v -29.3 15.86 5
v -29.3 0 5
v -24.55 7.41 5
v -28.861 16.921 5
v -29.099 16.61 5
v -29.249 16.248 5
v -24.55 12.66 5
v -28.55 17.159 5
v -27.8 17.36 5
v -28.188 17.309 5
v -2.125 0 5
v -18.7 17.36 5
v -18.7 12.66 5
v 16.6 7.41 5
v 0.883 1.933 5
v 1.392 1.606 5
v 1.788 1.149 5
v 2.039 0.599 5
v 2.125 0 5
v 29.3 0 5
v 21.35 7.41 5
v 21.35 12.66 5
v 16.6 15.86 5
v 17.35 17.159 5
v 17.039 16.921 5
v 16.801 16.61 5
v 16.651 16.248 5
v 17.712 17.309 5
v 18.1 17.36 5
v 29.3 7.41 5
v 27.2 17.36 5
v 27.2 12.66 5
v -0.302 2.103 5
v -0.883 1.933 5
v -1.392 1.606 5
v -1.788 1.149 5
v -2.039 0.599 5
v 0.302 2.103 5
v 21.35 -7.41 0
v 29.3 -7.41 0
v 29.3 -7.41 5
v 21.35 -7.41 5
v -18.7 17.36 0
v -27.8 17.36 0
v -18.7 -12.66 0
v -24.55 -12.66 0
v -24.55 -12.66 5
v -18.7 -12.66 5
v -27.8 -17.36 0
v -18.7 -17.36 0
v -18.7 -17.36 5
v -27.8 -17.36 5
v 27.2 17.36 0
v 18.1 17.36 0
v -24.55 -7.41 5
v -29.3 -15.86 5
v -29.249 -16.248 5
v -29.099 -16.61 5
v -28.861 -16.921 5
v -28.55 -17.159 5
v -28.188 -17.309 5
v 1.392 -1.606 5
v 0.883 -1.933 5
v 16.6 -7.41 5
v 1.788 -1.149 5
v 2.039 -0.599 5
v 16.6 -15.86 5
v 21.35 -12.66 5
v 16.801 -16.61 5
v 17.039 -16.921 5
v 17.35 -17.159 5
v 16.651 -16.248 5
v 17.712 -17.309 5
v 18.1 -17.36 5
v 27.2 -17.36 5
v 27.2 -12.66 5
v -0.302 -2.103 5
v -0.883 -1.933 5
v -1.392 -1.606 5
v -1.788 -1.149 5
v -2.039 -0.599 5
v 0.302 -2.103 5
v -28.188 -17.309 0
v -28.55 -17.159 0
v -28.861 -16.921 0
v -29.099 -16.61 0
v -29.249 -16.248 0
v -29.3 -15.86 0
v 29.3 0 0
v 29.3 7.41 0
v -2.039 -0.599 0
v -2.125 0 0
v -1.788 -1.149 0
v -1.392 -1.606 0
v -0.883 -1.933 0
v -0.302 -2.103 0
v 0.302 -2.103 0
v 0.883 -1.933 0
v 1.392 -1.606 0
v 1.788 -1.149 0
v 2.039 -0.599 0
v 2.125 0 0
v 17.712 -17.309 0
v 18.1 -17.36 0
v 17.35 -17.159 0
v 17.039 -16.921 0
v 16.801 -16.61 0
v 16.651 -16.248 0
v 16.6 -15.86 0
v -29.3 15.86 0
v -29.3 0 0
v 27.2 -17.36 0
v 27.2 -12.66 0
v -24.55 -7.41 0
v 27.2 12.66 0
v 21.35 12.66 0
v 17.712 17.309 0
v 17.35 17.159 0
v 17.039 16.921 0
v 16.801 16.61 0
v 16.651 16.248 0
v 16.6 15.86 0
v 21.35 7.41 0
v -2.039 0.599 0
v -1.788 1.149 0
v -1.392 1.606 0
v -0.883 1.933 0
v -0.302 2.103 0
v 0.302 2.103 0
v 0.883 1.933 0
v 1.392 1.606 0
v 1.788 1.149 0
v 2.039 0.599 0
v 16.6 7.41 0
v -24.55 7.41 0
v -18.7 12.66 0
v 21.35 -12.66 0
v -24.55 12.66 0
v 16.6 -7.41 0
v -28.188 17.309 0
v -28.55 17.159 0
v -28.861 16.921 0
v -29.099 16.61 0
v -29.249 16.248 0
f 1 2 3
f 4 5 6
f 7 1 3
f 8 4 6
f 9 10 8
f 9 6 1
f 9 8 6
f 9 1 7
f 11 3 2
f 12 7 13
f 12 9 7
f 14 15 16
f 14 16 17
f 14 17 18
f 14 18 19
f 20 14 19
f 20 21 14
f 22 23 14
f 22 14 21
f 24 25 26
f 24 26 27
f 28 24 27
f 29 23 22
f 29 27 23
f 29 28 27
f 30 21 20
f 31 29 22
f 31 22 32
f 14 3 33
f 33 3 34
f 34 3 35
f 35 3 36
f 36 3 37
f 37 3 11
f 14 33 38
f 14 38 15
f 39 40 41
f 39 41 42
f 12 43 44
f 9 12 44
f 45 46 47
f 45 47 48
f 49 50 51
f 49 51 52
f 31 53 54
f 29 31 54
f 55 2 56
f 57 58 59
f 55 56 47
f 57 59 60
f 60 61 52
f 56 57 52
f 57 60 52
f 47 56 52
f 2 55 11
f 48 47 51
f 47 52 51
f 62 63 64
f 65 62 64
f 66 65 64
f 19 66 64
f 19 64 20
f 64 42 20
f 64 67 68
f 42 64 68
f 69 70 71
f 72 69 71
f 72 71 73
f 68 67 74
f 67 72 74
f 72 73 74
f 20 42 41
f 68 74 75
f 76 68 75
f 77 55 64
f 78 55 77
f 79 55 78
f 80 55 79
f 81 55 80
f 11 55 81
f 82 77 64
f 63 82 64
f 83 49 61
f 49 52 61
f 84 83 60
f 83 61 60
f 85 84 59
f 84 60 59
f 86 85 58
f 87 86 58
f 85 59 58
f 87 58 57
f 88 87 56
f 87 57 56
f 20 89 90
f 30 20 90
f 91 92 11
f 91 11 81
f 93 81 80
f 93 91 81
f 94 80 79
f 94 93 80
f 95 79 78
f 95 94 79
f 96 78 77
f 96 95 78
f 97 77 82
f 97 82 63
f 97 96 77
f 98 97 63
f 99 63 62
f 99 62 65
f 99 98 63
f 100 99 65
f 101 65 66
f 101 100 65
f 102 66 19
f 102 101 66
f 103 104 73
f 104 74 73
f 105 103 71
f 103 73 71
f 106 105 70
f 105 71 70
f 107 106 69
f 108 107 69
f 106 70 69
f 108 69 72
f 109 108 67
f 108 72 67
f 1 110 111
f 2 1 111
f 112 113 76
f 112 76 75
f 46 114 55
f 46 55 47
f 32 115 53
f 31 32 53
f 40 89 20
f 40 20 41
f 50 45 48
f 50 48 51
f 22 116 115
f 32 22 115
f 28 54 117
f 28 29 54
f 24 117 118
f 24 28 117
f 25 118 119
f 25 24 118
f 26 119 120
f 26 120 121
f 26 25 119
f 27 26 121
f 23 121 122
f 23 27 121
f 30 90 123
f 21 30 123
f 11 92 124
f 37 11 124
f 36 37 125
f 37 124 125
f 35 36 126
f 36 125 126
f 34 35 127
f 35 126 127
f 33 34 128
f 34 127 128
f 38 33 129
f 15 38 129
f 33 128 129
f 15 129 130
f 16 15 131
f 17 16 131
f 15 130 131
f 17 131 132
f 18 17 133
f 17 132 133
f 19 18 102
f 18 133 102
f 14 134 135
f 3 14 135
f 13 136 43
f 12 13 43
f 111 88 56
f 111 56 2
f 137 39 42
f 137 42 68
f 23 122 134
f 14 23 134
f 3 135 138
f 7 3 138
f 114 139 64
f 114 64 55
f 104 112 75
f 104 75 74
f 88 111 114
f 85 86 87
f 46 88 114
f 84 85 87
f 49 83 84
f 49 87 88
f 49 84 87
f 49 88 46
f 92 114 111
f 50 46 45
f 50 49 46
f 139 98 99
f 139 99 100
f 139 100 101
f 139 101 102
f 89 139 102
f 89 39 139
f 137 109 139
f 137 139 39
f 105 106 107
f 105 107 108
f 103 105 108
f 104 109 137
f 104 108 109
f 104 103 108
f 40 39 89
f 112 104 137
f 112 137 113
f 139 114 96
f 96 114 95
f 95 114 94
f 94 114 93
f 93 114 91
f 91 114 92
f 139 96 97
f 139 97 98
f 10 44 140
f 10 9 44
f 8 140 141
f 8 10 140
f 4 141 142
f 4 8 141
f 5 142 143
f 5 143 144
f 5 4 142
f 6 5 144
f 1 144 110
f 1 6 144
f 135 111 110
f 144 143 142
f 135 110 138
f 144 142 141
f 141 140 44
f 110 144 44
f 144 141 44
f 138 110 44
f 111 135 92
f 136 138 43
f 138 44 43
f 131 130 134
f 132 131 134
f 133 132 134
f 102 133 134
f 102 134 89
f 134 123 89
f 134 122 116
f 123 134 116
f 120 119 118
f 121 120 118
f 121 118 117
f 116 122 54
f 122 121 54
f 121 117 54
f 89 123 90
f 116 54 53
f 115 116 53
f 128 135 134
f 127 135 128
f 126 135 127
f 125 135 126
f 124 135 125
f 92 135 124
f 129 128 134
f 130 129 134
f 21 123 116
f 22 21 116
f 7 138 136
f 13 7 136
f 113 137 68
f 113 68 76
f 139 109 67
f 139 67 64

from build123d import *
from build123d import SkipClean  # not in build123d's __all__

# Parameters (mm, degrees)
F1_DEPTH = 5
F2_R     = 1.5


with BuildPart() as f1:
    # F0 (on Top) → F1 (new body)
    with BuildSketch(Plane.XY):
        with BuildLine():
            ThreePointArc((-2.125, 0), (0, 2.125), (2.125, 0))
            Line((2.125, 0), (29.3, 0))
            Line((29.3, 0), (29.3, 7.41))
            Line((29.3, 7.41), (21.35, 7.41))
            Line((21.35, 7.41), (21.35, 12.66))
            Line((21.35, 12.66), (27.2, 12.66))
            Line((27.2, 12.66), (27.2, 17.36))
            Line((27.2, 17.36), (16.6, 17.36))
            Line((16.6, 17.36), (16.6, 7.41))
            Line((16.6, 7.41), (-24.55, 7.41))
            Line((-24.55, 7.41), (-24.55, 12.66))
            Line((-24.55, 12.66), (-18.7, 12.66))
            Line((-18.7, 12.66), (-18.7, 17.36))
            Line((-18.7, 17.36), (-29.3, 17.36))
            Line((-29.3, 17.36), (-29.3, 0))
            Line((-29.3, 0), (-2.125, 0))
        make_face()
    extrude(amount=F1_DEPTH)

    # F2
    f2_edges = [f1.edges().sort_by_distance(p)[0] for p in [
        (-29.3, 17.36, 2.5),
        (16.6, 17.36, 2.5),
    ]]
    fillet(f2_edges, radius=F2_R)

    # F3: F1 across face


with BuildPart() as f1_1:
    add(f1.part, clean=False)
    with SkipClean():  # cleaning this boolean's faces spoils the solid; the shape is the same uncleaned
        add(f1.part.mirror(Plane(origin=(-15.7125, 0, 2.5), x_dir=(1, 0, 0), z_dir=(0, -1, 0))), clean=False)


solid = f1_1.part
